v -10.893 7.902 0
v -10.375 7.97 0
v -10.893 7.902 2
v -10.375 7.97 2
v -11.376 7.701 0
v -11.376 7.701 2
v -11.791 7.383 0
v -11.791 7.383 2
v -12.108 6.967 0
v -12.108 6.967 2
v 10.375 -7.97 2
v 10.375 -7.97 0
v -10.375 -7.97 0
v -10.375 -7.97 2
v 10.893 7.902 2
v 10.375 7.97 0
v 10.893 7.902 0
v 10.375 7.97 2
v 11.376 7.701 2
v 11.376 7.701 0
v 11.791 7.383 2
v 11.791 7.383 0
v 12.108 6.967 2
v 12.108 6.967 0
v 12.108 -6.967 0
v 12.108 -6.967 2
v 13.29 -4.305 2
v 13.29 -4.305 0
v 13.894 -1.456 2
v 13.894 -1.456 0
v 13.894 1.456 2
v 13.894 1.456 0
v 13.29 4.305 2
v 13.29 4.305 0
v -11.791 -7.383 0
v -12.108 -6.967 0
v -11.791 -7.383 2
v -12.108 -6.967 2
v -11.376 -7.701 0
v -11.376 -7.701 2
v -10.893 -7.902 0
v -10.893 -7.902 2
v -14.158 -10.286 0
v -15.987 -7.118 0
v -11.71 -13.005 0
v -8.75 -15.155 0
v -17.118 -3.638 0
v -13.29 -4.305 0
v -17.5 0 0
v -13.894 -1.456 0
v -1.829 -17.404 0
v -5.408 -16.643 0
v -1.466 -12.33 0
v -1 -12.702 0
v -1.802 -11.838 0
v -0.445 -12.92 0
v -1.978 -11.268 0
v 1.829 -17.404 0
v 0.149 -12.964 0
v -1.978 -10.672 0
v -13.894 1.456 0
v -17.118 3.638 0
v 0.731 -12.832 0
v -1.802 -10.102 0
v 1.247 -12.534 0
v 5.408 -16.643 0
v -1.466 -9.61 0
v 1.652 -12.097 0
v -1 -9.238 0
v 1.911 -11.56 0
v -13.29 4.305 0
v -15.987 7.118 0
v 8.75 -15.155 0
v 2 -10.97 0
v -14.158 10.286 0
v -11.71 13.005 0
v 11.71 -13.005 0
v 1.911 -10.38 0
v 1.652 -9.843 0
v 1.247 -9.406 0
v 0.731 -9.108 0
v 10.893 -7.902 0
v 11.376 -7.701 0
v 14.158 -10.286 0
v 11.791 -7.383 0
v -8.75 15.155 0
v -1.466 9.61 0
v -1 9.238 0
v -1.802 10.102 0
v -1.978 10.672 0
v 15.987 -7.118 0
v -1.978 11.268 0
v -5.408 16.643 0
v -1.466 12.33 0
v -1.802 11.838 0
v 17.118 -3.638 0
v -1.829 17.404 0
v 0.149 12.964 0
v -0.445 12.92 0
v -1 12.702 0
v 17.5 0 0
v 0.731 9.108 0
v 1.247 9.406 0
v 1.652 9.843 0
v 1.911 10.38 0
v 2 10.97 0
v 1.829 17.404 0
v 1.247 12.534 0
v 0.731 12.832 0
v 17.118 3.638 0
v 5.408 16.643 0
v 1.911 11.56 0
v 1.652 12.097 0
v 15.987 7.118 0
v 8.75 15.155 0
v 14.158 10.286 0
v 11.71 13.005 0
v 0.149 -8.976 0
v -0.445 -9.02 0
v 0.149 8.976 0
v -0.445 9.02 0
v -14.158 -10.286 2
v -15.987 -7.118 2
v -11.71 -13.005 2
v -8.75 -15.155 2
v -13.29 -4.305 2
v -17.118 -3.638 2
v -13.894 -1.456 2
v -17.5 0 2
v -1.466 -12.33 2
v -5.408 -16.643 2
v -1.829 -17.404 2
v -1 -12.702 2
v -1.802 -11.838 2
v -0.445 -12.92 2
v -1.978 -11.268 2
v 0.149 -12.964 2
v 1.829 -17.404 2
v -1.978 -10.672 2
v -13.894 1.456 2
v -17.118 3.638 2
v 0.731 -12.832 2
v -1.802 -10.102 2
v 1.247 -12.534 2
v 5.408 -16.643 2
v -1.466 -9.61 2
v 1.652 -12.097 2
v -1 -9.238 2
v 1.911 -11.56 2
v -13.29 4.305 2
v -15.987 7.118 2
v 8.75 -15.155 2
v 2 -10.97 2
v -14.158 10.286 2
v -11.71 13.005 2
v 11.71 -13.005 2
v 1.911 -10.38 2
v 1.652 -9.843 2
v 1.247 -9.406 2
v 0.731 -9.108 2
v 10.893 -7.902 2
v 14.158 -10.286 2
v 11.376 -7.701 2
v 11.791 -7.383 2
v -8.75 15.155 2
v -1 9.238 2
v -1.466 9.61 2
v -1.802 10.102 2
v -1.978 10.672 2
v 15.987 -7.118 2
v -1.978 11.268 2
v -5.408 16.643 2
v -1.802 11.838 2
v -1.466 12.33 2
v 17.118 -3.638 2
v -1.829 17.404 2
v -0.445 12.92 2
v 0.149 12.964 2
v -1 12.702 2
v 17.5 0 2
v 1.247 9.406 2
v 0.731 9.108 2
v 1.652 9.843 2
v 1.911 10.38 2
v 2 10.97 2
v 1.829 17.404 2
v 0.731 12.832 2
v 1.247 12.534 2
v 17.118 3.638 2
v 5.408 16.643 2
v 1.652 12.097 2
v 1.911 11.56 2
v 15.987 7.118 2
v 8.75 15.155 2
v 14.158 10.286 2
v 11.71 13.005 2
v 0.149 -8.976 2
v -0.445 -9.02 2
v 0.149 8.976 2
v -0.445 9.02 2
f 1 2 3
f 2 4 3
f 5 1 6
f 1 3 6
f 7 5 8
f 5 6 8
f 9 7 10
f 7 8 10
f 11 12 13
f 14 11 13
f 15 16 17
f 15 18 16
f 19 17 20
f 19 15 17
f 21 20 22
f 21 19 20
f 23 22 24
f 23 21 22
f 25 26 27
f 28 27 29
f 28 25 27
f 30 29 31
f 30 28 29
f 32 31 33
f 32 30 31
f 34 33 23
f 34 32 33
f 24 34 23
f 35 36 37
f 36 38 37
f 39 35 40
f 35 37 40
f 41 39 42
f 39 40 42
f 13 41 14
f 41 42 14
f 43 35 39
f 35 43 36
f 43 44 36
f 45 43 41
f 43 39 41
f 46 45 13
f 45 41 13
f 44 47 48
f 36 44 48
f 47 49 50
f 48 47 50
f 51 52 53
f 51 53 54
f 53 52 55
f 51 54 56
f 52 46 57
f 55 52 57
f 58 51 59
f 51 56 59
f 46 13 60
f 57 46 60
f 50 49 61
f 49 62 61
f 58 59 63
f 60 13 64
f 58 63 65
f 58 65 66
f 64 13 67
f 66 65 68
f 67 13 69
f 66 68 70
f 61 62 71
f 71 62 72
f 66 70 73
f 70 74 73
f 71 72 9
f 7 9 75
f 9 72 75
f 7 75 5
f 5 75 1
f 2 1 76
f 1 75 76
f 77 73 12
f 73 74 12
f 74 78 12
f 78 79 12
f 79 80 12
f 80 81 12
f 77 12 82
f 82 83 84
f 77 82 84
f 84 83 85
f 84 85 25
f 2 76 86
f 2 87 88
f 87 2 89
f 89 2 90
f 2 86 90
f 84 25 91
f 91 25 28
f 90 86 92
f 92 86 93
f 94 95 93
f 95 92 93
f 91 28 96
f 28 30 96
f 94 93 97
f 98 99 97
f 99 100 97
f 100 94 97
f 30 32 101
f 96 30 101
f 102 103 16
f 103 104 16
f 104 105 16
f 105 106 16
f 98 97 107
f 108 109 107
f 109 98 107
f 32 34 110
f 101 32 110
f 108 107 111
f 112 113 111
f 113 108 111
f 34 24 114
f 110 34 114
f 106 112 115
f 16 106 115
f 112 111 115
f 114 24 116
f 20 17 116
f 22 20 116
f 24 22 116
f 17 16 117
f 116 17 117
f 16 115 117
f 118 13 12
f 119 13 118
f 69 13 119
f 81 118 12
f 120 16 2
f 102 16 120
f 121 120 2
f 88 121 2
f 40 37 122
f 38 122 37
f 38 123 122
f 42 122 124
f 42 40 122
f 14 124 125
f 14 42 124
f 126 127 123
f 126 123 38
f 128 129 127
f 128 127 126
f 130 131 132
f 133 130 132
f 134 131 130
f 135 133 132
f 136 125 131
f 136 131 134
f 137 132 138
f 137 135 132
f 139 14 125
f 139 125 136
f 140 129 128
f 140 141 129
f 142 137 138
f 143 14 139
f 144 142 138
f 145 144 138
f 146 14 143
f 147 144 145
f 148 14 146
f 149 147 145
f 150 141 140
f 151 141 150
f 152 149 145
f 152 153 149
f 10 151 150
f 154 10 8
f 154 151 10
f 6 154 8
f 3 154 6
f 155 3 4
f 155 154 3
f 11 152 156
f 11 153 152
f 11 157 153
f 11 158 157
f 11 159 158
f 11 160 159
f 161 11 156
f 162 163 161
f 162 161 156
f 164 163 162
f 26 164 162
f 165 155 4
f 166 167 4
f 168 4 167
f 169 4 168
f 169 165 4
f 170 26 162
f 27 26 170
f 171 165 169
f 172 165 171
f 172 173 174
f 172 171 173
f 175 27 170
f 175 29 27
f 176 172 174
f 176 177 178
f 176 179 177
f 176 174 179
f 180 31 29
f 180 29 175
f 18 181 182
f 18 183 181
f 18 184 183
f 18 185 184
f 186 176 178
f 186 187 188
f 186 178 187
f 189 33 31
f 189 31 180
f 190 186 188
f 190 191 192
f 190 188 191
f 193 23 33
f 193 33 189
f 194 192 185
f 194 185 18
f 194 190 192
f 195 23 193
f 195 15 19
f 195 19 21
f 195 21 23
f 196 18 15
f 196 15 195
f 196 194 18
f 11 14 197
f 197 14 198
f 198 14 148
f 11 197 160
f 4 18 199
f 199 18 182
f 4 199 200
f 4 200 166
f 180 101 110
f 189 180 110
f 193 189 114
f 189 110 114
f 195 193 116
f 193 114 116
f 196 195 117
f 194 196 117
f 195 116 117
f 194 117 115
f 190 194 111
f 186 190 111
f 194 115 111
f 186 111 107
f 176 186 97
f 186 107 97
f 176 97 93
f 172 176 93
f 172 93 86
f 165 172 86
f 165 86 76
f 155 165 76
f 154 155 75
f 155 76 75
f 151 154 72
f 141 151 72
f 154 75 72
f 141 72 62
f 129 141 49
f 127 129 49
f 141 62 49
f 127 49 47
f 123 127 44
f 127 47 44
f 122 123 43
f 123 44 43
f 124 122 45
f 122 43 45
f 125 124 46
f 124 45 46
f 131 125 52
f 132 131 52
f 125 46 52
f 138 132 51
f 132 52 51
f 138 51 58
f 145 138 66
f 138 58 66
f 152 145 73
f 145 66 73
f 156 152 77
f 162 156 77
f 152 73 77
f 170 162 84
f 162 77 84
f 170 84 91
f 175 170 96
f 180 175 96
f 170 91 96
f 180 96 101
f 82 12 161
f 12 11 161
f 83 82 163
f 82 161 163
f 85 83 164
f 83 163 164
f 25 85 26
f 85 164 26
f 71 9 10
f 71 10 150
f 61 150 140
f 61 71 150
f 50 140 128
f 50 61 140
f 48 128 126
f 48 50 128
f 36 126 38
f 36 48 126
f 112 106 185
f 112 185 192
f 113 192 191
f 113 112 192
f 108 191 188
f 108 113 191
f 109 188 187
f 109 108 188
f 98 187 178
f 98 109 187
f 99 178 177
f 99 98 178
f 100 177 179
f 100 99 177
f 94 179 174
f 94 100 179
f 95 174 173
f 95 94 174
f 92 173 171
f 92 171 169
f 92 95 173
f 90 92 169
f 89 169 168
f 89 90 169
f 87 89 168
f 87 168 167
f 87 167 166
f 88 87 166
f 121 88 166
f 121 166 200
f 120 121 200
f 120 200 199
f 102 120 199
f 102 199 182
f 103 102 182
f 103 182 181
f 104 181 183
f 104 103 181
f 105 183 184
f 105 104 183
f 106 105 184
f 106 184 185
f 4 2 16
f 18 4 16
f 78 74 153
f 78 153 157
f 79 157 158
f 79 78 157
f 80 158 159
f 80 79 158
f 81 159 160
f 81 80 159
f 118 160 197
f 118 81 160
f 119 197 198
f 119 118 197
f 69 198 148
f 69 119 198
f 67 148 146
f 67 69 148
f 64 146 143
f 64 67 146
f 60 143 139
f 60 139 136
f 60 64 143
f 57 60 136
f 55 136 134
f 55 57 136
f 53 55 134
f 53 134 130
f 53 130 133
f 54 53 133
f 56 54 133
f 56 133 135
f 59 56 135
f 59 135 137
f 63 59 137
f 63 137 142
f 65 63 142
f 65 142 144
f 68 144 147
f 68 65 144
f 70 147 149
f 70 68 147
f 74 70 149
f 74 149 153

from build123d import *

# Parameters (mm, degrees)
SKETCH1_R           = 17.5
SKETCH1_R_2         = 13.97
SKETCH1_R_3         = 2
BOSS_EXTRUDE1_DEPTH = 2
FILLET1_R           = 2


with BuildPart() as part:
    # Sketch1 → Boss-Extrude1 (new body)
    # profile 1 of 3: a face of its own
    with BuildSketch(Plane.XY):
        Circle(SKETCH1_R)
        Circle(SKETCH1_R_2, mode=Mode.SUBTRACT)
    # profile 2 of 3: a face of its own
    with BuildSketch(Plane.XY):
        with BuildLine():
            Line((11.473447607, -7.97), (-11.473447607, -7.97))
            ThreePointArc((-11.473447607, -7.97), (0, -13.97), (11.473447607, -7.97))
        make_face()
        with Locations((0, -10.97)):
            Circle(SKETCH1_R_3, mode=Mode.SUBTRACT)
    # profile 3 of 3: a face of its own
    with BuildSketch(Plane.XY):
        with BuildLine():
            Line((-11.473447607, 7.97), (11.473447607, 7.97))
            ThreePointArc((11.473447607, 7.97), (0, 13.97), (-11.473447607, 7.97))
        make_face()
        with Locations((0, 10.97)):
            Circle(SKETCH1_R_3, mode=Mode.SUBTRACT)
    extrude(amount=BOSS_EXTRUDE1_DEPTH)

    # Fillet1
    fillet1_edges = [part.edges().sort_by_distance(p)[0] for p in [
        (11.473447607, -7.97, 1),
        (11.473447607, 7.97, 1),
        (-11.473447607, 7.97, 1),
        (-11.473447607, -7.97, 1),
    ]]
    fillet(fillet1_edges, radius=FILLET1_R)


solid = part.part
